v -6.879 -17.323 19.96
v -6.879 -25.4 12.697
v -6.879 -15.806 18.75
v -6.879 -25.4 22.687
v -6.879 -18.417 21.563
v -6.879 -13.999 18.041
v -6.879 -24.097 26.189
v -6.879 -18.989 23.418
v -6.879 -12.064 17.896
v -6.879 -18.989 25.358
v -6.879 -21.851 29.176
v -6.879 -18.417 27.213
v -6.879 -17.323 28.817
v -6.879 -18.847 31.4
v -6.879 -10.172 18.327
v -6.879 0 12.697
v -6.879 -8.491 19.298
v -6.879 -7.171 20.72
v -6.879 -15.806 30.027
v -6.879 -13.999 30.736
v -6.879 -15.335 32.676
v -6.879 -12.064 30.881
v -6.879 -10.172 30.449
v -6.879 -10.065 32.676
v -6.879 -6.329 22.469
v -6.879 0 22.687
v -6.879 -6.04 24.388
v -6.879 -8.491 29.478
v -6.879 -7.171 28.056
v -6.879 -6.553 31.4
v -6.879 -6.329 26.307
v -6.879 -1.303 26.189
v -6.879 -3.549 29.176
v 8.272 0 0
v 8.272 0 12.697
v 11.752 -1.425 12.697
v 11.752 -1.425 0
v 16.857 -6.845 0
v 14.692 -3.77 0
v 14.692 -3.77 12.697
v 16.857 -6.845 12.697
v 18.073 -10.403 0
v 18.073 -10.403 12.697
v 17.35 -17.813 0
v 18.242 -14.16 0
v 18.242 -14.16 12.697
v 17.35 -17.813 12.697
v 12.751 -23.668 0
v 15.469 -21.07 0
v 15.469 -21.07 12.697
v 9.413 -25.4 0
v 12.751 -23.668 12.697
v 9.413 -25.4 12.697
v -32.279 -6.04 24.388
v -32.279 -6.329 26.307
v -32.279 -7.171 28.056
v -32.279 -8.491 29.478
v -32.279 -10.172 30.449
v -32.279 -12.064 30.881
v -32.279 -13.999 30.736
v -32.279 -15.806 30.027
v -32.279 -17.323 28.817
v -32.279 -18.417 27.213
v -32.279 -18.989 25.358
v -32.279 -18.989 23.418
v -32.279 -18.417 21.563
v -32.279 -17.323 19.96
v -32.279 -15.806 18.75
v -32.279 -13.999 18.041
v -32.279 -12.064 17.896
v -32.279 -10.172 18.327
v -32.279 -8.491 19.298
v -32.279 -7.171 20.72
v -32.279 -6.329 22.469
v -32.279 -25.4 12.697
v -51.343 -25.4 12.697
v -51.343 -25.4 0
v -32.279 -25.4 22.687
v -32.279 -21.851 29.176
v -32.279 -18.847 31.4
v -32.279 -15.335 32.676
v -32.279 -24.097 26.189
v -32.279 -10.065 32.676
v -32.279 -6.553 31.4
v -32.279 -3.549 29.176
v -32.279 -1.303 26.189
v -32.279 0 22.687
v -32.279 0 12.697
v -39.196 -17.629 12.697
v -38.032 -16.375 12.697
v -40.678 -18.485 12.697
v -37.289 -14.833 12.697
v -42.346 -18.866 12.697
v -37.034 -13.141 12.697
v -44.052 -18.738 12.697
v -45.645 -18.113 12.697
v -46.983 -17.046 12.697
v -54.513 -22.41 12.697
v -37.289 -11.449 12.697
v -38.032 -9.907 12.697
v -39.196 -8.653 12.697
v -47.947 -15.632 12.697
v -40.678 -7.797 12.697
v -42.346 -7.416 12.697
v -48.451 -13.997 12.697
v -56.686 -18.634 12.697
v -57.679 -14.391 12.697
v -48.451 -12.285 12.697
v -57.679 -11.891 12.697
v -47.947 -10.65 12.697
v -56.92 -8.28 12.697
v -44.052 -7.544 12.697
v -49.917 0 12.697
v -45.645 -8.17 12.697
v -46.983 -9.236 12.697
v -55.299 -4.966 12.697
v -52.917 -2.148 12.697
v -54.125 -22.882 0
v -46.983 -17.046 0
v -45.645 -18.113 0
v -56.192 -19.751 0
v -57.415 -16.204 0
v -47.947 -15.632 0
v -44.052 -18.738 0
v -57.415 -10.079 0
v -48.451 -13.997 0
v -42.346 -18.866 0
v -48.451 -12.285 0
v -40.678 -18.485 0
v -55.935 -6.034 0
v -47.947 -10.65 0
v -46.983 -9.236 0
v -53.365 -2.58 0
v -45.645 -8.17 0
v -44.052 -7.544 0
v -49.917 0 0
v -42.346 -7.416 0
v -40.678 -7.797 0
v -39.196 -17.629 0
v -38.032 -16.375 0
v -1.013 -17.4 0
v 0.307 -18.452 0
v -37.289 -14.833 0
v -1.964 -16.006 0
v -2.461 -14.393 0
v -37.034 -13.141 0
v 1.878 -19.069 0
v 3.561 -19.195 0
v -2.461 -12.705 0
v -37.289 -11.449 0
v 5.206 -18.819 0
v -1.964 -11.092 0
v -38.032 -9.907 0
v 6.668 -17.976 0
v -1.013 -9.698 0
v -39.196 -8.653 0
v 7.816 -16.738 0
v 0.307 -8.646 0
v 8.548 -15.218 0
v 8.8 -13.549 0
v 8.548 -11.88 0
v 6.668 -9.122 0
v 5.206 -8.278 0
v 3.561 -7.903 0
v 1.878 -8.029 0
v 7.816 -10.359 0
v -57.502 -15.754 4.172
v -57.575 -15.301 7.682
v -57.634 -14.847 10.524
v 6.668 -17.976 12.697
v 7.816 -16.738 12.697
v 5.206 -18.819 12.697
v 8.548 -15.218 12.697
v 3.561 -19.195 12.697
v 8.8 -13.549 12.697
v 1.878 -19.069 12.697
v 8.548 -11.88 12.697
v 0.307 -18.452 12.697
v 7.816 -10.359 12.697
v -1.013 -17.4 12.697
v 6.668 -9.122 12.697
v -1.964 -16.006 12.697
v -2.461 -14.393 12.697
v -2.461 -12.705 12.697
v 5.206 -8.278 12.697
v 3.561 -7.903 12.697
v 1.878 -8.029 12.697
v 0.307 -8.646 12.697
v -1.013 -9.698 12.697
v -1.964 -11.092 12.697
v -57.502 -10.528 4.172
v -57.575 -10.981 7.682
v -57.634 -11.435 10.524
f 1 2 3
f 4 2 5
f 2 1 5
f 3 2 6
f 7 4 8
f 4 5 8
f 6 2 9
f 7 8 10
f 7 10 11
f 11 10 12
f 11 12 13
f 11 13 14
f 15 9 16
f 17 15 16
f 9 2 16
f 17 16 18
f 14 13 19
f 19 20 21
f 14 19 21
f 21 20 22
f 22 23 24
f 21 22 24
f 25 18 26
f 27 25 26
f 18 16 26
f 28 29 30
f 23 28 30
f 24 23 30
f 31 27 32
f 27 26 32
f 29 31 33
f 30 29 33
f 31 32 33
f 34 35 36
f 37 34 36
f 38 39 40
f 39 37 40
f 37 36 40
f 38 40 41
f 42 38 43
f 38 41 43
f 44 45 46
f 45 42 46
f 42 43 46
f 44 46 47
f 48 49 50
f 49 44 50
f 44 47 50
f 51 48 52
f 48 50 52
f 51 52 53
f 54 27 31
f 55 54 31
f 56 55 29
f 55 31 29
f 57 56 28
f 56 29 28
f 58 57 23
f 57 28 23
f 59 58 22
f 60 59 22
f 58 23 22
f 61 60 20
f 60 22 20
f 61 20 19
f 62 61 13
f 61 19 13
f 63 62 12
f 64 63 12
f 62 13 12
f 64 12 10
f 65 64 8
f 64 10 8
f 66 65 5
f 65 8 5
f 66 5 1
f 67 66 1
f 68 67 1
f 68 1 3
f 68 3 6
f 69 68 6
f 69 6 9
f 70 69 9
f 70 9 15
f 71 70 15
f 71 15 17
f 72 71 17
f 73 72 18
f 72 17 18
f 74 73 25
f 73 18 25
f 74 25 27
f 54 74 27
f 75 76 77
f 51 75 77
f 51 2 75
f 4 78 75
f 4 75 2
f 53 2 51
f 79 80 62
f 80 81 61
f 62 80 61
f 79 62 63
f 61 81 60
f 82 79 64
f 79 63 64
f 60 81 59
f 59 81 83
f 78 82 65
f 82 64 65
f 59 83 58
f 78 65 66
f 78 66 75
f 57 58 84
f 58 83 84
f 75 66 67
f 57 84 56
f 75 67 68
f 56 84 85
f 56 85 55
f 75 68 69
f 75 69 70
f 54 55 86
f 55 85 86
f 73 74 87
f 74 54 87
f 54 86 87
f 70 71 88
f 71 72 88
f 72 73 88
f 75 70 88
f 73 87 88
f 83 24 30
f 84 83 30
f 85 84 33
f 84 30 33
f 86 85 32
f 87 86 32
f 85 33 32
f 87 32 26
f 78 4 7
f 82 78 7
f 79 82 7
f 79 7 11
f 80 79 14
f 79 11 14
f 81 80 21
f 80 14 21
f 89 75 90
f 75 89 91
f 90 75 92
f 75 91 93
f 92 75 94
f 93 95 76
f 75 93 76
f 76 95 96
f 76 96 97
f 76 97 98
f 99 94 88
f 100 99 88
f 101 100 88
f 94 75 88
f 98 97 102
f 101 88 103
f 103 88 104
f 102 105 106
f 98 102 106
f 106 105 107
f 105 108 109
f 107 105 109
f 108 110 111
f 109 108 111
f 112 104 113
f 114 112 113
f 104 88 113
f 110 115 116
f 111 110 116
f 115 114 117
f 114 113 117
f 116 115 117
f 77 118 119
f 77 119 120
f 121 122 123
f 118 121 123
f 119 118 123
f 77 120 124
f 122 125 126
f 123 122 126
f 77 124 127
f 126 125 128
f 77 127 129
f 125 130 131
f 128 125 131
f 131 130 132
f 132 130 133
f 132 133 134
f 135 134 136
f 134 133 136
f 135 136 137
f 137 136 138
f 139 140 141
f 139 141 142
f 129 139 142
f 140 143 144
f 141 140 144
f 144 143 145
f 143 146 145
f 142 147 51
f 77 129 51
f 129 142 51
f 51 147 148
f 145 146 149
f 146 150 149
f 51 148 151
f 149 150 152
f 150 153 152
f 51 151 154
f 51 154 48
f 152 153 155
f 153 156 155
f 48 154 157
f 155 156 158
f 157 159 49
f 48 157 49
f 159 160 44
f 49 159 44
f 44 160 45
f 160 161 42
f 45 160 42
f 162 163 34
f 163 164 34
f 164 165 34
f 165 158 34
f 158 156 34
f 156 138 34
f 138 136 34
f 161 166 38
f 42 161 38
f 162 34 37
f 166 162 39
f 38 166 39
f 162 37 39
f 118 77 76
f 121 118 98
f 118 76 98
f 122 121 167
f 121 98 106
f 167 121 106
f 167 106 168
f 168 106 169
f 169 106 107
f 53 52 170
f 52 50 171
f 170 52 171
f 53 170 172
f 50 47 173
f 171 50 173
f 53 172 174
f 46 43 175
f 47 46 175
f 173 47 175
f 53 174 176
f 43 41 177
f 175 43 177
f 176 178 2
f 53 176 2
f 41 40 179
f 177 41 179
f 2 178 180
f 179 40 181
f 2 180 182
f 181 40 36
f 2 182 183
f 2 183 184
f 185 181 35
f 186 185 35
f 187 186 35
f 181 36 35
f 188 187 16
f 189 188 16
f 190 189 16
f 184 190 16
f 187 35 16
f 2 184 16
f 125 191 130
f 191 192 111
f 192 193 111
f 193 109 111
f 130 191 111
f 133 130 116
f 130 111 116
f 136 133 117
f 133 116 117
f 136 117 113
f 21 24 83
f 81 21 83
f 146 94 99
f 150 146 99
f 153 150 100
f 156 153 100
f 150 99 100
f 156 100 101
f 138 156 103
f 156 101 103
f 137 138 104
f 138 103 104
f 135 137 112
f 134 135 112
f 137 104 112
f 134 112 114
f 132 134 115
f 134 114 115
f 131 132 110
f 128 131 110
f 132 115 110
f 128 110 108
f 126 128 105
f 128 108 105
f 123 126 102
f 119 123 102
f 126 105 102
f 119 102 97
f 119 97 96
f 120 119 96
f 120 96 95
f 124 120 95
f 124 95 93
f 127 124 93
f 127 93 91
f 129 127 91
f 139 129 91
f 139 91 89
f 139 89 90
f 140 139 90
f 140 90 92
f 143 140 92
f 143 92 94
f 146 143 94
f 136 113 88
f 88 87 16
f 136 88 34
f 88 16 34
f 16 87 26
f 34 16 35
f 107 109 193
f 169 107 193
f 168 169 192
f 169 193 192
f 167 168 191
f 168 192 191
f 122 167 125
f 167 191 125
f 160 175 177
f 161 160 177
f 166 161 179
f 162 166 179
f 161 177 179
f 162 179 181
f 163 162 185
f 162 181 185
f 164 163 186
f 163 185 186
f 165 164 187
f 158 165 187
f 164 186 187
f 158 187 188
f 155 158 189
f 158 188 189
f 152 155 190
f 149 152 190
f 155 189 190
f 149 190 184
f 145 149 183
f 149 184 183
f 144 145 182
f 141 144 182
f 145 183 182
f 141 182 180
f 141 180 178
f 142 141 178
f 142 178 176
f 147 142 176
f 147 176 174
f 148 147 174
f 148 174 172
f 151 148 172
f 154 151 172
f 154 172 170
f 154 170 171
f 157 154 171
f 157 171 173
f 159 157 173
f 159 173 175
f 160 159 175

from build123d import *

# Parameters (mm, degrees)
F1_DEPTH  = 25.4
F3_DEPTH  = 25.4
F5_DEPTH  = 25.4
F7_DEPTH  = 25.4
F8_R      = 5.661864
F8_R_2    = 5.740655
F9_DEPTH  = 25.4
F10_R     = 6.51074
F11_DEPTH = 25.4


with BuildPart() as f1:
    # F0 (on Front) → F1 (new body)
    with BuildSketch(Plane.XZ):
        Polygon((-57.679164, 12.697244), (-57.414579, 0), (18.520836, 0), (18.520836, 12.697244), (-6.879164, 12.697244), (-6.879164, 32.676041), (-32.279164, 32.676041), (-32.279164, 12.697244), align=None)
    extrude(amount=F1_DEPTH)

    # F2 (on face) → F3 (cut)
    with BuildSketch(Plane.YZ.offset(-6.879164)):
        with BuildLine():
            ThreePointArc((-25.4, 22.686642), (-21.850641, 29.175992), (-15.334563, 32.676041))
            Line((-15.334563, 32.676041), (-25.4, 32.676041))
            Line((-25.4, 32.676041), (-25.4, 22.686642))
        make_face()
        with BuildLine():
            ThreePointArc((-10.065437, 32.676041), (-3.549359, 29.175992), (0, 22.686642))
            Line((0, 22.686642), (0, 32.676041))
            Line((0, 32.676041), (-10.065437, 32.676041))
        make_face()
    extrude(amount=-F3_DEPTH, mode=Mode.SUBTRACT)

    # F4 (on face) → F5 (cut)
    with BuildSketch(Plane.XY.offset(12.697244)):
        with BuildLine():
            ThreePointArc((-57.679164, -11.891091), (-55.299332, -4.965624), (-49.917113, 0))
            Line((-49.917113, 0), (-57.679164, 0))
            Line((-57.679164, 0), (-57.679164, -11.891091))
        make_face()
        with BuildLine():
            ThreePointArc((-51.343318, -25.4), (-55.737963, -20.601527), (-57.679164, -14.391054))
            Line((-57.679164, -14.391054), (-57.679164, -25.4))
            Line((-57.679164, -25.4), (-51.343318, -25.4))
        make_face()
    extrude(amount=-F5_DEPTH, mode=Mode.SUBTRACT)

    # F6 (on face) → F7 (cut)
    with BuildSketch(Plane.XY.offset(12.697244)):
        with BuildLine():
            ThreePointArc((8.271978, 0), (18.290982, -12.275574), (9.412941, -25.4))
            Line((9.412941, -25.4), (18.520836, -25.4))
            Line((18.520836, -25.4), (18.520836, 0))
            Line((18.520836, 0), (8.271978, 0))
        make_face()
    extrude(amount=-F7_DEPTH, mode=Mode.SUBTRACT)

    # F8 (on face) → F9 (cut)
    with BuildSketch(Plane.XY.offset(12.697244)):
        with Locations((3.137648, -13.54893)):
            Circle(F8_R)
        with Locations((-42.774935, -13.141072)):
            Circle(F8_R_2)
    extrude(amount=-F9_DEPTH, mode=Mode.SUBTRACT)

    # F10 (on face) → F11 (cut)
    with BuildSketch(Plane.YZ.offset(-6.879164)):
        with Locations((-12.550588, 24.388077)):
            Circle(F10_R)
    extrude(amount=-F11_DEPTH, mode=Mode.SUBTRACT)


solid = f1.part
